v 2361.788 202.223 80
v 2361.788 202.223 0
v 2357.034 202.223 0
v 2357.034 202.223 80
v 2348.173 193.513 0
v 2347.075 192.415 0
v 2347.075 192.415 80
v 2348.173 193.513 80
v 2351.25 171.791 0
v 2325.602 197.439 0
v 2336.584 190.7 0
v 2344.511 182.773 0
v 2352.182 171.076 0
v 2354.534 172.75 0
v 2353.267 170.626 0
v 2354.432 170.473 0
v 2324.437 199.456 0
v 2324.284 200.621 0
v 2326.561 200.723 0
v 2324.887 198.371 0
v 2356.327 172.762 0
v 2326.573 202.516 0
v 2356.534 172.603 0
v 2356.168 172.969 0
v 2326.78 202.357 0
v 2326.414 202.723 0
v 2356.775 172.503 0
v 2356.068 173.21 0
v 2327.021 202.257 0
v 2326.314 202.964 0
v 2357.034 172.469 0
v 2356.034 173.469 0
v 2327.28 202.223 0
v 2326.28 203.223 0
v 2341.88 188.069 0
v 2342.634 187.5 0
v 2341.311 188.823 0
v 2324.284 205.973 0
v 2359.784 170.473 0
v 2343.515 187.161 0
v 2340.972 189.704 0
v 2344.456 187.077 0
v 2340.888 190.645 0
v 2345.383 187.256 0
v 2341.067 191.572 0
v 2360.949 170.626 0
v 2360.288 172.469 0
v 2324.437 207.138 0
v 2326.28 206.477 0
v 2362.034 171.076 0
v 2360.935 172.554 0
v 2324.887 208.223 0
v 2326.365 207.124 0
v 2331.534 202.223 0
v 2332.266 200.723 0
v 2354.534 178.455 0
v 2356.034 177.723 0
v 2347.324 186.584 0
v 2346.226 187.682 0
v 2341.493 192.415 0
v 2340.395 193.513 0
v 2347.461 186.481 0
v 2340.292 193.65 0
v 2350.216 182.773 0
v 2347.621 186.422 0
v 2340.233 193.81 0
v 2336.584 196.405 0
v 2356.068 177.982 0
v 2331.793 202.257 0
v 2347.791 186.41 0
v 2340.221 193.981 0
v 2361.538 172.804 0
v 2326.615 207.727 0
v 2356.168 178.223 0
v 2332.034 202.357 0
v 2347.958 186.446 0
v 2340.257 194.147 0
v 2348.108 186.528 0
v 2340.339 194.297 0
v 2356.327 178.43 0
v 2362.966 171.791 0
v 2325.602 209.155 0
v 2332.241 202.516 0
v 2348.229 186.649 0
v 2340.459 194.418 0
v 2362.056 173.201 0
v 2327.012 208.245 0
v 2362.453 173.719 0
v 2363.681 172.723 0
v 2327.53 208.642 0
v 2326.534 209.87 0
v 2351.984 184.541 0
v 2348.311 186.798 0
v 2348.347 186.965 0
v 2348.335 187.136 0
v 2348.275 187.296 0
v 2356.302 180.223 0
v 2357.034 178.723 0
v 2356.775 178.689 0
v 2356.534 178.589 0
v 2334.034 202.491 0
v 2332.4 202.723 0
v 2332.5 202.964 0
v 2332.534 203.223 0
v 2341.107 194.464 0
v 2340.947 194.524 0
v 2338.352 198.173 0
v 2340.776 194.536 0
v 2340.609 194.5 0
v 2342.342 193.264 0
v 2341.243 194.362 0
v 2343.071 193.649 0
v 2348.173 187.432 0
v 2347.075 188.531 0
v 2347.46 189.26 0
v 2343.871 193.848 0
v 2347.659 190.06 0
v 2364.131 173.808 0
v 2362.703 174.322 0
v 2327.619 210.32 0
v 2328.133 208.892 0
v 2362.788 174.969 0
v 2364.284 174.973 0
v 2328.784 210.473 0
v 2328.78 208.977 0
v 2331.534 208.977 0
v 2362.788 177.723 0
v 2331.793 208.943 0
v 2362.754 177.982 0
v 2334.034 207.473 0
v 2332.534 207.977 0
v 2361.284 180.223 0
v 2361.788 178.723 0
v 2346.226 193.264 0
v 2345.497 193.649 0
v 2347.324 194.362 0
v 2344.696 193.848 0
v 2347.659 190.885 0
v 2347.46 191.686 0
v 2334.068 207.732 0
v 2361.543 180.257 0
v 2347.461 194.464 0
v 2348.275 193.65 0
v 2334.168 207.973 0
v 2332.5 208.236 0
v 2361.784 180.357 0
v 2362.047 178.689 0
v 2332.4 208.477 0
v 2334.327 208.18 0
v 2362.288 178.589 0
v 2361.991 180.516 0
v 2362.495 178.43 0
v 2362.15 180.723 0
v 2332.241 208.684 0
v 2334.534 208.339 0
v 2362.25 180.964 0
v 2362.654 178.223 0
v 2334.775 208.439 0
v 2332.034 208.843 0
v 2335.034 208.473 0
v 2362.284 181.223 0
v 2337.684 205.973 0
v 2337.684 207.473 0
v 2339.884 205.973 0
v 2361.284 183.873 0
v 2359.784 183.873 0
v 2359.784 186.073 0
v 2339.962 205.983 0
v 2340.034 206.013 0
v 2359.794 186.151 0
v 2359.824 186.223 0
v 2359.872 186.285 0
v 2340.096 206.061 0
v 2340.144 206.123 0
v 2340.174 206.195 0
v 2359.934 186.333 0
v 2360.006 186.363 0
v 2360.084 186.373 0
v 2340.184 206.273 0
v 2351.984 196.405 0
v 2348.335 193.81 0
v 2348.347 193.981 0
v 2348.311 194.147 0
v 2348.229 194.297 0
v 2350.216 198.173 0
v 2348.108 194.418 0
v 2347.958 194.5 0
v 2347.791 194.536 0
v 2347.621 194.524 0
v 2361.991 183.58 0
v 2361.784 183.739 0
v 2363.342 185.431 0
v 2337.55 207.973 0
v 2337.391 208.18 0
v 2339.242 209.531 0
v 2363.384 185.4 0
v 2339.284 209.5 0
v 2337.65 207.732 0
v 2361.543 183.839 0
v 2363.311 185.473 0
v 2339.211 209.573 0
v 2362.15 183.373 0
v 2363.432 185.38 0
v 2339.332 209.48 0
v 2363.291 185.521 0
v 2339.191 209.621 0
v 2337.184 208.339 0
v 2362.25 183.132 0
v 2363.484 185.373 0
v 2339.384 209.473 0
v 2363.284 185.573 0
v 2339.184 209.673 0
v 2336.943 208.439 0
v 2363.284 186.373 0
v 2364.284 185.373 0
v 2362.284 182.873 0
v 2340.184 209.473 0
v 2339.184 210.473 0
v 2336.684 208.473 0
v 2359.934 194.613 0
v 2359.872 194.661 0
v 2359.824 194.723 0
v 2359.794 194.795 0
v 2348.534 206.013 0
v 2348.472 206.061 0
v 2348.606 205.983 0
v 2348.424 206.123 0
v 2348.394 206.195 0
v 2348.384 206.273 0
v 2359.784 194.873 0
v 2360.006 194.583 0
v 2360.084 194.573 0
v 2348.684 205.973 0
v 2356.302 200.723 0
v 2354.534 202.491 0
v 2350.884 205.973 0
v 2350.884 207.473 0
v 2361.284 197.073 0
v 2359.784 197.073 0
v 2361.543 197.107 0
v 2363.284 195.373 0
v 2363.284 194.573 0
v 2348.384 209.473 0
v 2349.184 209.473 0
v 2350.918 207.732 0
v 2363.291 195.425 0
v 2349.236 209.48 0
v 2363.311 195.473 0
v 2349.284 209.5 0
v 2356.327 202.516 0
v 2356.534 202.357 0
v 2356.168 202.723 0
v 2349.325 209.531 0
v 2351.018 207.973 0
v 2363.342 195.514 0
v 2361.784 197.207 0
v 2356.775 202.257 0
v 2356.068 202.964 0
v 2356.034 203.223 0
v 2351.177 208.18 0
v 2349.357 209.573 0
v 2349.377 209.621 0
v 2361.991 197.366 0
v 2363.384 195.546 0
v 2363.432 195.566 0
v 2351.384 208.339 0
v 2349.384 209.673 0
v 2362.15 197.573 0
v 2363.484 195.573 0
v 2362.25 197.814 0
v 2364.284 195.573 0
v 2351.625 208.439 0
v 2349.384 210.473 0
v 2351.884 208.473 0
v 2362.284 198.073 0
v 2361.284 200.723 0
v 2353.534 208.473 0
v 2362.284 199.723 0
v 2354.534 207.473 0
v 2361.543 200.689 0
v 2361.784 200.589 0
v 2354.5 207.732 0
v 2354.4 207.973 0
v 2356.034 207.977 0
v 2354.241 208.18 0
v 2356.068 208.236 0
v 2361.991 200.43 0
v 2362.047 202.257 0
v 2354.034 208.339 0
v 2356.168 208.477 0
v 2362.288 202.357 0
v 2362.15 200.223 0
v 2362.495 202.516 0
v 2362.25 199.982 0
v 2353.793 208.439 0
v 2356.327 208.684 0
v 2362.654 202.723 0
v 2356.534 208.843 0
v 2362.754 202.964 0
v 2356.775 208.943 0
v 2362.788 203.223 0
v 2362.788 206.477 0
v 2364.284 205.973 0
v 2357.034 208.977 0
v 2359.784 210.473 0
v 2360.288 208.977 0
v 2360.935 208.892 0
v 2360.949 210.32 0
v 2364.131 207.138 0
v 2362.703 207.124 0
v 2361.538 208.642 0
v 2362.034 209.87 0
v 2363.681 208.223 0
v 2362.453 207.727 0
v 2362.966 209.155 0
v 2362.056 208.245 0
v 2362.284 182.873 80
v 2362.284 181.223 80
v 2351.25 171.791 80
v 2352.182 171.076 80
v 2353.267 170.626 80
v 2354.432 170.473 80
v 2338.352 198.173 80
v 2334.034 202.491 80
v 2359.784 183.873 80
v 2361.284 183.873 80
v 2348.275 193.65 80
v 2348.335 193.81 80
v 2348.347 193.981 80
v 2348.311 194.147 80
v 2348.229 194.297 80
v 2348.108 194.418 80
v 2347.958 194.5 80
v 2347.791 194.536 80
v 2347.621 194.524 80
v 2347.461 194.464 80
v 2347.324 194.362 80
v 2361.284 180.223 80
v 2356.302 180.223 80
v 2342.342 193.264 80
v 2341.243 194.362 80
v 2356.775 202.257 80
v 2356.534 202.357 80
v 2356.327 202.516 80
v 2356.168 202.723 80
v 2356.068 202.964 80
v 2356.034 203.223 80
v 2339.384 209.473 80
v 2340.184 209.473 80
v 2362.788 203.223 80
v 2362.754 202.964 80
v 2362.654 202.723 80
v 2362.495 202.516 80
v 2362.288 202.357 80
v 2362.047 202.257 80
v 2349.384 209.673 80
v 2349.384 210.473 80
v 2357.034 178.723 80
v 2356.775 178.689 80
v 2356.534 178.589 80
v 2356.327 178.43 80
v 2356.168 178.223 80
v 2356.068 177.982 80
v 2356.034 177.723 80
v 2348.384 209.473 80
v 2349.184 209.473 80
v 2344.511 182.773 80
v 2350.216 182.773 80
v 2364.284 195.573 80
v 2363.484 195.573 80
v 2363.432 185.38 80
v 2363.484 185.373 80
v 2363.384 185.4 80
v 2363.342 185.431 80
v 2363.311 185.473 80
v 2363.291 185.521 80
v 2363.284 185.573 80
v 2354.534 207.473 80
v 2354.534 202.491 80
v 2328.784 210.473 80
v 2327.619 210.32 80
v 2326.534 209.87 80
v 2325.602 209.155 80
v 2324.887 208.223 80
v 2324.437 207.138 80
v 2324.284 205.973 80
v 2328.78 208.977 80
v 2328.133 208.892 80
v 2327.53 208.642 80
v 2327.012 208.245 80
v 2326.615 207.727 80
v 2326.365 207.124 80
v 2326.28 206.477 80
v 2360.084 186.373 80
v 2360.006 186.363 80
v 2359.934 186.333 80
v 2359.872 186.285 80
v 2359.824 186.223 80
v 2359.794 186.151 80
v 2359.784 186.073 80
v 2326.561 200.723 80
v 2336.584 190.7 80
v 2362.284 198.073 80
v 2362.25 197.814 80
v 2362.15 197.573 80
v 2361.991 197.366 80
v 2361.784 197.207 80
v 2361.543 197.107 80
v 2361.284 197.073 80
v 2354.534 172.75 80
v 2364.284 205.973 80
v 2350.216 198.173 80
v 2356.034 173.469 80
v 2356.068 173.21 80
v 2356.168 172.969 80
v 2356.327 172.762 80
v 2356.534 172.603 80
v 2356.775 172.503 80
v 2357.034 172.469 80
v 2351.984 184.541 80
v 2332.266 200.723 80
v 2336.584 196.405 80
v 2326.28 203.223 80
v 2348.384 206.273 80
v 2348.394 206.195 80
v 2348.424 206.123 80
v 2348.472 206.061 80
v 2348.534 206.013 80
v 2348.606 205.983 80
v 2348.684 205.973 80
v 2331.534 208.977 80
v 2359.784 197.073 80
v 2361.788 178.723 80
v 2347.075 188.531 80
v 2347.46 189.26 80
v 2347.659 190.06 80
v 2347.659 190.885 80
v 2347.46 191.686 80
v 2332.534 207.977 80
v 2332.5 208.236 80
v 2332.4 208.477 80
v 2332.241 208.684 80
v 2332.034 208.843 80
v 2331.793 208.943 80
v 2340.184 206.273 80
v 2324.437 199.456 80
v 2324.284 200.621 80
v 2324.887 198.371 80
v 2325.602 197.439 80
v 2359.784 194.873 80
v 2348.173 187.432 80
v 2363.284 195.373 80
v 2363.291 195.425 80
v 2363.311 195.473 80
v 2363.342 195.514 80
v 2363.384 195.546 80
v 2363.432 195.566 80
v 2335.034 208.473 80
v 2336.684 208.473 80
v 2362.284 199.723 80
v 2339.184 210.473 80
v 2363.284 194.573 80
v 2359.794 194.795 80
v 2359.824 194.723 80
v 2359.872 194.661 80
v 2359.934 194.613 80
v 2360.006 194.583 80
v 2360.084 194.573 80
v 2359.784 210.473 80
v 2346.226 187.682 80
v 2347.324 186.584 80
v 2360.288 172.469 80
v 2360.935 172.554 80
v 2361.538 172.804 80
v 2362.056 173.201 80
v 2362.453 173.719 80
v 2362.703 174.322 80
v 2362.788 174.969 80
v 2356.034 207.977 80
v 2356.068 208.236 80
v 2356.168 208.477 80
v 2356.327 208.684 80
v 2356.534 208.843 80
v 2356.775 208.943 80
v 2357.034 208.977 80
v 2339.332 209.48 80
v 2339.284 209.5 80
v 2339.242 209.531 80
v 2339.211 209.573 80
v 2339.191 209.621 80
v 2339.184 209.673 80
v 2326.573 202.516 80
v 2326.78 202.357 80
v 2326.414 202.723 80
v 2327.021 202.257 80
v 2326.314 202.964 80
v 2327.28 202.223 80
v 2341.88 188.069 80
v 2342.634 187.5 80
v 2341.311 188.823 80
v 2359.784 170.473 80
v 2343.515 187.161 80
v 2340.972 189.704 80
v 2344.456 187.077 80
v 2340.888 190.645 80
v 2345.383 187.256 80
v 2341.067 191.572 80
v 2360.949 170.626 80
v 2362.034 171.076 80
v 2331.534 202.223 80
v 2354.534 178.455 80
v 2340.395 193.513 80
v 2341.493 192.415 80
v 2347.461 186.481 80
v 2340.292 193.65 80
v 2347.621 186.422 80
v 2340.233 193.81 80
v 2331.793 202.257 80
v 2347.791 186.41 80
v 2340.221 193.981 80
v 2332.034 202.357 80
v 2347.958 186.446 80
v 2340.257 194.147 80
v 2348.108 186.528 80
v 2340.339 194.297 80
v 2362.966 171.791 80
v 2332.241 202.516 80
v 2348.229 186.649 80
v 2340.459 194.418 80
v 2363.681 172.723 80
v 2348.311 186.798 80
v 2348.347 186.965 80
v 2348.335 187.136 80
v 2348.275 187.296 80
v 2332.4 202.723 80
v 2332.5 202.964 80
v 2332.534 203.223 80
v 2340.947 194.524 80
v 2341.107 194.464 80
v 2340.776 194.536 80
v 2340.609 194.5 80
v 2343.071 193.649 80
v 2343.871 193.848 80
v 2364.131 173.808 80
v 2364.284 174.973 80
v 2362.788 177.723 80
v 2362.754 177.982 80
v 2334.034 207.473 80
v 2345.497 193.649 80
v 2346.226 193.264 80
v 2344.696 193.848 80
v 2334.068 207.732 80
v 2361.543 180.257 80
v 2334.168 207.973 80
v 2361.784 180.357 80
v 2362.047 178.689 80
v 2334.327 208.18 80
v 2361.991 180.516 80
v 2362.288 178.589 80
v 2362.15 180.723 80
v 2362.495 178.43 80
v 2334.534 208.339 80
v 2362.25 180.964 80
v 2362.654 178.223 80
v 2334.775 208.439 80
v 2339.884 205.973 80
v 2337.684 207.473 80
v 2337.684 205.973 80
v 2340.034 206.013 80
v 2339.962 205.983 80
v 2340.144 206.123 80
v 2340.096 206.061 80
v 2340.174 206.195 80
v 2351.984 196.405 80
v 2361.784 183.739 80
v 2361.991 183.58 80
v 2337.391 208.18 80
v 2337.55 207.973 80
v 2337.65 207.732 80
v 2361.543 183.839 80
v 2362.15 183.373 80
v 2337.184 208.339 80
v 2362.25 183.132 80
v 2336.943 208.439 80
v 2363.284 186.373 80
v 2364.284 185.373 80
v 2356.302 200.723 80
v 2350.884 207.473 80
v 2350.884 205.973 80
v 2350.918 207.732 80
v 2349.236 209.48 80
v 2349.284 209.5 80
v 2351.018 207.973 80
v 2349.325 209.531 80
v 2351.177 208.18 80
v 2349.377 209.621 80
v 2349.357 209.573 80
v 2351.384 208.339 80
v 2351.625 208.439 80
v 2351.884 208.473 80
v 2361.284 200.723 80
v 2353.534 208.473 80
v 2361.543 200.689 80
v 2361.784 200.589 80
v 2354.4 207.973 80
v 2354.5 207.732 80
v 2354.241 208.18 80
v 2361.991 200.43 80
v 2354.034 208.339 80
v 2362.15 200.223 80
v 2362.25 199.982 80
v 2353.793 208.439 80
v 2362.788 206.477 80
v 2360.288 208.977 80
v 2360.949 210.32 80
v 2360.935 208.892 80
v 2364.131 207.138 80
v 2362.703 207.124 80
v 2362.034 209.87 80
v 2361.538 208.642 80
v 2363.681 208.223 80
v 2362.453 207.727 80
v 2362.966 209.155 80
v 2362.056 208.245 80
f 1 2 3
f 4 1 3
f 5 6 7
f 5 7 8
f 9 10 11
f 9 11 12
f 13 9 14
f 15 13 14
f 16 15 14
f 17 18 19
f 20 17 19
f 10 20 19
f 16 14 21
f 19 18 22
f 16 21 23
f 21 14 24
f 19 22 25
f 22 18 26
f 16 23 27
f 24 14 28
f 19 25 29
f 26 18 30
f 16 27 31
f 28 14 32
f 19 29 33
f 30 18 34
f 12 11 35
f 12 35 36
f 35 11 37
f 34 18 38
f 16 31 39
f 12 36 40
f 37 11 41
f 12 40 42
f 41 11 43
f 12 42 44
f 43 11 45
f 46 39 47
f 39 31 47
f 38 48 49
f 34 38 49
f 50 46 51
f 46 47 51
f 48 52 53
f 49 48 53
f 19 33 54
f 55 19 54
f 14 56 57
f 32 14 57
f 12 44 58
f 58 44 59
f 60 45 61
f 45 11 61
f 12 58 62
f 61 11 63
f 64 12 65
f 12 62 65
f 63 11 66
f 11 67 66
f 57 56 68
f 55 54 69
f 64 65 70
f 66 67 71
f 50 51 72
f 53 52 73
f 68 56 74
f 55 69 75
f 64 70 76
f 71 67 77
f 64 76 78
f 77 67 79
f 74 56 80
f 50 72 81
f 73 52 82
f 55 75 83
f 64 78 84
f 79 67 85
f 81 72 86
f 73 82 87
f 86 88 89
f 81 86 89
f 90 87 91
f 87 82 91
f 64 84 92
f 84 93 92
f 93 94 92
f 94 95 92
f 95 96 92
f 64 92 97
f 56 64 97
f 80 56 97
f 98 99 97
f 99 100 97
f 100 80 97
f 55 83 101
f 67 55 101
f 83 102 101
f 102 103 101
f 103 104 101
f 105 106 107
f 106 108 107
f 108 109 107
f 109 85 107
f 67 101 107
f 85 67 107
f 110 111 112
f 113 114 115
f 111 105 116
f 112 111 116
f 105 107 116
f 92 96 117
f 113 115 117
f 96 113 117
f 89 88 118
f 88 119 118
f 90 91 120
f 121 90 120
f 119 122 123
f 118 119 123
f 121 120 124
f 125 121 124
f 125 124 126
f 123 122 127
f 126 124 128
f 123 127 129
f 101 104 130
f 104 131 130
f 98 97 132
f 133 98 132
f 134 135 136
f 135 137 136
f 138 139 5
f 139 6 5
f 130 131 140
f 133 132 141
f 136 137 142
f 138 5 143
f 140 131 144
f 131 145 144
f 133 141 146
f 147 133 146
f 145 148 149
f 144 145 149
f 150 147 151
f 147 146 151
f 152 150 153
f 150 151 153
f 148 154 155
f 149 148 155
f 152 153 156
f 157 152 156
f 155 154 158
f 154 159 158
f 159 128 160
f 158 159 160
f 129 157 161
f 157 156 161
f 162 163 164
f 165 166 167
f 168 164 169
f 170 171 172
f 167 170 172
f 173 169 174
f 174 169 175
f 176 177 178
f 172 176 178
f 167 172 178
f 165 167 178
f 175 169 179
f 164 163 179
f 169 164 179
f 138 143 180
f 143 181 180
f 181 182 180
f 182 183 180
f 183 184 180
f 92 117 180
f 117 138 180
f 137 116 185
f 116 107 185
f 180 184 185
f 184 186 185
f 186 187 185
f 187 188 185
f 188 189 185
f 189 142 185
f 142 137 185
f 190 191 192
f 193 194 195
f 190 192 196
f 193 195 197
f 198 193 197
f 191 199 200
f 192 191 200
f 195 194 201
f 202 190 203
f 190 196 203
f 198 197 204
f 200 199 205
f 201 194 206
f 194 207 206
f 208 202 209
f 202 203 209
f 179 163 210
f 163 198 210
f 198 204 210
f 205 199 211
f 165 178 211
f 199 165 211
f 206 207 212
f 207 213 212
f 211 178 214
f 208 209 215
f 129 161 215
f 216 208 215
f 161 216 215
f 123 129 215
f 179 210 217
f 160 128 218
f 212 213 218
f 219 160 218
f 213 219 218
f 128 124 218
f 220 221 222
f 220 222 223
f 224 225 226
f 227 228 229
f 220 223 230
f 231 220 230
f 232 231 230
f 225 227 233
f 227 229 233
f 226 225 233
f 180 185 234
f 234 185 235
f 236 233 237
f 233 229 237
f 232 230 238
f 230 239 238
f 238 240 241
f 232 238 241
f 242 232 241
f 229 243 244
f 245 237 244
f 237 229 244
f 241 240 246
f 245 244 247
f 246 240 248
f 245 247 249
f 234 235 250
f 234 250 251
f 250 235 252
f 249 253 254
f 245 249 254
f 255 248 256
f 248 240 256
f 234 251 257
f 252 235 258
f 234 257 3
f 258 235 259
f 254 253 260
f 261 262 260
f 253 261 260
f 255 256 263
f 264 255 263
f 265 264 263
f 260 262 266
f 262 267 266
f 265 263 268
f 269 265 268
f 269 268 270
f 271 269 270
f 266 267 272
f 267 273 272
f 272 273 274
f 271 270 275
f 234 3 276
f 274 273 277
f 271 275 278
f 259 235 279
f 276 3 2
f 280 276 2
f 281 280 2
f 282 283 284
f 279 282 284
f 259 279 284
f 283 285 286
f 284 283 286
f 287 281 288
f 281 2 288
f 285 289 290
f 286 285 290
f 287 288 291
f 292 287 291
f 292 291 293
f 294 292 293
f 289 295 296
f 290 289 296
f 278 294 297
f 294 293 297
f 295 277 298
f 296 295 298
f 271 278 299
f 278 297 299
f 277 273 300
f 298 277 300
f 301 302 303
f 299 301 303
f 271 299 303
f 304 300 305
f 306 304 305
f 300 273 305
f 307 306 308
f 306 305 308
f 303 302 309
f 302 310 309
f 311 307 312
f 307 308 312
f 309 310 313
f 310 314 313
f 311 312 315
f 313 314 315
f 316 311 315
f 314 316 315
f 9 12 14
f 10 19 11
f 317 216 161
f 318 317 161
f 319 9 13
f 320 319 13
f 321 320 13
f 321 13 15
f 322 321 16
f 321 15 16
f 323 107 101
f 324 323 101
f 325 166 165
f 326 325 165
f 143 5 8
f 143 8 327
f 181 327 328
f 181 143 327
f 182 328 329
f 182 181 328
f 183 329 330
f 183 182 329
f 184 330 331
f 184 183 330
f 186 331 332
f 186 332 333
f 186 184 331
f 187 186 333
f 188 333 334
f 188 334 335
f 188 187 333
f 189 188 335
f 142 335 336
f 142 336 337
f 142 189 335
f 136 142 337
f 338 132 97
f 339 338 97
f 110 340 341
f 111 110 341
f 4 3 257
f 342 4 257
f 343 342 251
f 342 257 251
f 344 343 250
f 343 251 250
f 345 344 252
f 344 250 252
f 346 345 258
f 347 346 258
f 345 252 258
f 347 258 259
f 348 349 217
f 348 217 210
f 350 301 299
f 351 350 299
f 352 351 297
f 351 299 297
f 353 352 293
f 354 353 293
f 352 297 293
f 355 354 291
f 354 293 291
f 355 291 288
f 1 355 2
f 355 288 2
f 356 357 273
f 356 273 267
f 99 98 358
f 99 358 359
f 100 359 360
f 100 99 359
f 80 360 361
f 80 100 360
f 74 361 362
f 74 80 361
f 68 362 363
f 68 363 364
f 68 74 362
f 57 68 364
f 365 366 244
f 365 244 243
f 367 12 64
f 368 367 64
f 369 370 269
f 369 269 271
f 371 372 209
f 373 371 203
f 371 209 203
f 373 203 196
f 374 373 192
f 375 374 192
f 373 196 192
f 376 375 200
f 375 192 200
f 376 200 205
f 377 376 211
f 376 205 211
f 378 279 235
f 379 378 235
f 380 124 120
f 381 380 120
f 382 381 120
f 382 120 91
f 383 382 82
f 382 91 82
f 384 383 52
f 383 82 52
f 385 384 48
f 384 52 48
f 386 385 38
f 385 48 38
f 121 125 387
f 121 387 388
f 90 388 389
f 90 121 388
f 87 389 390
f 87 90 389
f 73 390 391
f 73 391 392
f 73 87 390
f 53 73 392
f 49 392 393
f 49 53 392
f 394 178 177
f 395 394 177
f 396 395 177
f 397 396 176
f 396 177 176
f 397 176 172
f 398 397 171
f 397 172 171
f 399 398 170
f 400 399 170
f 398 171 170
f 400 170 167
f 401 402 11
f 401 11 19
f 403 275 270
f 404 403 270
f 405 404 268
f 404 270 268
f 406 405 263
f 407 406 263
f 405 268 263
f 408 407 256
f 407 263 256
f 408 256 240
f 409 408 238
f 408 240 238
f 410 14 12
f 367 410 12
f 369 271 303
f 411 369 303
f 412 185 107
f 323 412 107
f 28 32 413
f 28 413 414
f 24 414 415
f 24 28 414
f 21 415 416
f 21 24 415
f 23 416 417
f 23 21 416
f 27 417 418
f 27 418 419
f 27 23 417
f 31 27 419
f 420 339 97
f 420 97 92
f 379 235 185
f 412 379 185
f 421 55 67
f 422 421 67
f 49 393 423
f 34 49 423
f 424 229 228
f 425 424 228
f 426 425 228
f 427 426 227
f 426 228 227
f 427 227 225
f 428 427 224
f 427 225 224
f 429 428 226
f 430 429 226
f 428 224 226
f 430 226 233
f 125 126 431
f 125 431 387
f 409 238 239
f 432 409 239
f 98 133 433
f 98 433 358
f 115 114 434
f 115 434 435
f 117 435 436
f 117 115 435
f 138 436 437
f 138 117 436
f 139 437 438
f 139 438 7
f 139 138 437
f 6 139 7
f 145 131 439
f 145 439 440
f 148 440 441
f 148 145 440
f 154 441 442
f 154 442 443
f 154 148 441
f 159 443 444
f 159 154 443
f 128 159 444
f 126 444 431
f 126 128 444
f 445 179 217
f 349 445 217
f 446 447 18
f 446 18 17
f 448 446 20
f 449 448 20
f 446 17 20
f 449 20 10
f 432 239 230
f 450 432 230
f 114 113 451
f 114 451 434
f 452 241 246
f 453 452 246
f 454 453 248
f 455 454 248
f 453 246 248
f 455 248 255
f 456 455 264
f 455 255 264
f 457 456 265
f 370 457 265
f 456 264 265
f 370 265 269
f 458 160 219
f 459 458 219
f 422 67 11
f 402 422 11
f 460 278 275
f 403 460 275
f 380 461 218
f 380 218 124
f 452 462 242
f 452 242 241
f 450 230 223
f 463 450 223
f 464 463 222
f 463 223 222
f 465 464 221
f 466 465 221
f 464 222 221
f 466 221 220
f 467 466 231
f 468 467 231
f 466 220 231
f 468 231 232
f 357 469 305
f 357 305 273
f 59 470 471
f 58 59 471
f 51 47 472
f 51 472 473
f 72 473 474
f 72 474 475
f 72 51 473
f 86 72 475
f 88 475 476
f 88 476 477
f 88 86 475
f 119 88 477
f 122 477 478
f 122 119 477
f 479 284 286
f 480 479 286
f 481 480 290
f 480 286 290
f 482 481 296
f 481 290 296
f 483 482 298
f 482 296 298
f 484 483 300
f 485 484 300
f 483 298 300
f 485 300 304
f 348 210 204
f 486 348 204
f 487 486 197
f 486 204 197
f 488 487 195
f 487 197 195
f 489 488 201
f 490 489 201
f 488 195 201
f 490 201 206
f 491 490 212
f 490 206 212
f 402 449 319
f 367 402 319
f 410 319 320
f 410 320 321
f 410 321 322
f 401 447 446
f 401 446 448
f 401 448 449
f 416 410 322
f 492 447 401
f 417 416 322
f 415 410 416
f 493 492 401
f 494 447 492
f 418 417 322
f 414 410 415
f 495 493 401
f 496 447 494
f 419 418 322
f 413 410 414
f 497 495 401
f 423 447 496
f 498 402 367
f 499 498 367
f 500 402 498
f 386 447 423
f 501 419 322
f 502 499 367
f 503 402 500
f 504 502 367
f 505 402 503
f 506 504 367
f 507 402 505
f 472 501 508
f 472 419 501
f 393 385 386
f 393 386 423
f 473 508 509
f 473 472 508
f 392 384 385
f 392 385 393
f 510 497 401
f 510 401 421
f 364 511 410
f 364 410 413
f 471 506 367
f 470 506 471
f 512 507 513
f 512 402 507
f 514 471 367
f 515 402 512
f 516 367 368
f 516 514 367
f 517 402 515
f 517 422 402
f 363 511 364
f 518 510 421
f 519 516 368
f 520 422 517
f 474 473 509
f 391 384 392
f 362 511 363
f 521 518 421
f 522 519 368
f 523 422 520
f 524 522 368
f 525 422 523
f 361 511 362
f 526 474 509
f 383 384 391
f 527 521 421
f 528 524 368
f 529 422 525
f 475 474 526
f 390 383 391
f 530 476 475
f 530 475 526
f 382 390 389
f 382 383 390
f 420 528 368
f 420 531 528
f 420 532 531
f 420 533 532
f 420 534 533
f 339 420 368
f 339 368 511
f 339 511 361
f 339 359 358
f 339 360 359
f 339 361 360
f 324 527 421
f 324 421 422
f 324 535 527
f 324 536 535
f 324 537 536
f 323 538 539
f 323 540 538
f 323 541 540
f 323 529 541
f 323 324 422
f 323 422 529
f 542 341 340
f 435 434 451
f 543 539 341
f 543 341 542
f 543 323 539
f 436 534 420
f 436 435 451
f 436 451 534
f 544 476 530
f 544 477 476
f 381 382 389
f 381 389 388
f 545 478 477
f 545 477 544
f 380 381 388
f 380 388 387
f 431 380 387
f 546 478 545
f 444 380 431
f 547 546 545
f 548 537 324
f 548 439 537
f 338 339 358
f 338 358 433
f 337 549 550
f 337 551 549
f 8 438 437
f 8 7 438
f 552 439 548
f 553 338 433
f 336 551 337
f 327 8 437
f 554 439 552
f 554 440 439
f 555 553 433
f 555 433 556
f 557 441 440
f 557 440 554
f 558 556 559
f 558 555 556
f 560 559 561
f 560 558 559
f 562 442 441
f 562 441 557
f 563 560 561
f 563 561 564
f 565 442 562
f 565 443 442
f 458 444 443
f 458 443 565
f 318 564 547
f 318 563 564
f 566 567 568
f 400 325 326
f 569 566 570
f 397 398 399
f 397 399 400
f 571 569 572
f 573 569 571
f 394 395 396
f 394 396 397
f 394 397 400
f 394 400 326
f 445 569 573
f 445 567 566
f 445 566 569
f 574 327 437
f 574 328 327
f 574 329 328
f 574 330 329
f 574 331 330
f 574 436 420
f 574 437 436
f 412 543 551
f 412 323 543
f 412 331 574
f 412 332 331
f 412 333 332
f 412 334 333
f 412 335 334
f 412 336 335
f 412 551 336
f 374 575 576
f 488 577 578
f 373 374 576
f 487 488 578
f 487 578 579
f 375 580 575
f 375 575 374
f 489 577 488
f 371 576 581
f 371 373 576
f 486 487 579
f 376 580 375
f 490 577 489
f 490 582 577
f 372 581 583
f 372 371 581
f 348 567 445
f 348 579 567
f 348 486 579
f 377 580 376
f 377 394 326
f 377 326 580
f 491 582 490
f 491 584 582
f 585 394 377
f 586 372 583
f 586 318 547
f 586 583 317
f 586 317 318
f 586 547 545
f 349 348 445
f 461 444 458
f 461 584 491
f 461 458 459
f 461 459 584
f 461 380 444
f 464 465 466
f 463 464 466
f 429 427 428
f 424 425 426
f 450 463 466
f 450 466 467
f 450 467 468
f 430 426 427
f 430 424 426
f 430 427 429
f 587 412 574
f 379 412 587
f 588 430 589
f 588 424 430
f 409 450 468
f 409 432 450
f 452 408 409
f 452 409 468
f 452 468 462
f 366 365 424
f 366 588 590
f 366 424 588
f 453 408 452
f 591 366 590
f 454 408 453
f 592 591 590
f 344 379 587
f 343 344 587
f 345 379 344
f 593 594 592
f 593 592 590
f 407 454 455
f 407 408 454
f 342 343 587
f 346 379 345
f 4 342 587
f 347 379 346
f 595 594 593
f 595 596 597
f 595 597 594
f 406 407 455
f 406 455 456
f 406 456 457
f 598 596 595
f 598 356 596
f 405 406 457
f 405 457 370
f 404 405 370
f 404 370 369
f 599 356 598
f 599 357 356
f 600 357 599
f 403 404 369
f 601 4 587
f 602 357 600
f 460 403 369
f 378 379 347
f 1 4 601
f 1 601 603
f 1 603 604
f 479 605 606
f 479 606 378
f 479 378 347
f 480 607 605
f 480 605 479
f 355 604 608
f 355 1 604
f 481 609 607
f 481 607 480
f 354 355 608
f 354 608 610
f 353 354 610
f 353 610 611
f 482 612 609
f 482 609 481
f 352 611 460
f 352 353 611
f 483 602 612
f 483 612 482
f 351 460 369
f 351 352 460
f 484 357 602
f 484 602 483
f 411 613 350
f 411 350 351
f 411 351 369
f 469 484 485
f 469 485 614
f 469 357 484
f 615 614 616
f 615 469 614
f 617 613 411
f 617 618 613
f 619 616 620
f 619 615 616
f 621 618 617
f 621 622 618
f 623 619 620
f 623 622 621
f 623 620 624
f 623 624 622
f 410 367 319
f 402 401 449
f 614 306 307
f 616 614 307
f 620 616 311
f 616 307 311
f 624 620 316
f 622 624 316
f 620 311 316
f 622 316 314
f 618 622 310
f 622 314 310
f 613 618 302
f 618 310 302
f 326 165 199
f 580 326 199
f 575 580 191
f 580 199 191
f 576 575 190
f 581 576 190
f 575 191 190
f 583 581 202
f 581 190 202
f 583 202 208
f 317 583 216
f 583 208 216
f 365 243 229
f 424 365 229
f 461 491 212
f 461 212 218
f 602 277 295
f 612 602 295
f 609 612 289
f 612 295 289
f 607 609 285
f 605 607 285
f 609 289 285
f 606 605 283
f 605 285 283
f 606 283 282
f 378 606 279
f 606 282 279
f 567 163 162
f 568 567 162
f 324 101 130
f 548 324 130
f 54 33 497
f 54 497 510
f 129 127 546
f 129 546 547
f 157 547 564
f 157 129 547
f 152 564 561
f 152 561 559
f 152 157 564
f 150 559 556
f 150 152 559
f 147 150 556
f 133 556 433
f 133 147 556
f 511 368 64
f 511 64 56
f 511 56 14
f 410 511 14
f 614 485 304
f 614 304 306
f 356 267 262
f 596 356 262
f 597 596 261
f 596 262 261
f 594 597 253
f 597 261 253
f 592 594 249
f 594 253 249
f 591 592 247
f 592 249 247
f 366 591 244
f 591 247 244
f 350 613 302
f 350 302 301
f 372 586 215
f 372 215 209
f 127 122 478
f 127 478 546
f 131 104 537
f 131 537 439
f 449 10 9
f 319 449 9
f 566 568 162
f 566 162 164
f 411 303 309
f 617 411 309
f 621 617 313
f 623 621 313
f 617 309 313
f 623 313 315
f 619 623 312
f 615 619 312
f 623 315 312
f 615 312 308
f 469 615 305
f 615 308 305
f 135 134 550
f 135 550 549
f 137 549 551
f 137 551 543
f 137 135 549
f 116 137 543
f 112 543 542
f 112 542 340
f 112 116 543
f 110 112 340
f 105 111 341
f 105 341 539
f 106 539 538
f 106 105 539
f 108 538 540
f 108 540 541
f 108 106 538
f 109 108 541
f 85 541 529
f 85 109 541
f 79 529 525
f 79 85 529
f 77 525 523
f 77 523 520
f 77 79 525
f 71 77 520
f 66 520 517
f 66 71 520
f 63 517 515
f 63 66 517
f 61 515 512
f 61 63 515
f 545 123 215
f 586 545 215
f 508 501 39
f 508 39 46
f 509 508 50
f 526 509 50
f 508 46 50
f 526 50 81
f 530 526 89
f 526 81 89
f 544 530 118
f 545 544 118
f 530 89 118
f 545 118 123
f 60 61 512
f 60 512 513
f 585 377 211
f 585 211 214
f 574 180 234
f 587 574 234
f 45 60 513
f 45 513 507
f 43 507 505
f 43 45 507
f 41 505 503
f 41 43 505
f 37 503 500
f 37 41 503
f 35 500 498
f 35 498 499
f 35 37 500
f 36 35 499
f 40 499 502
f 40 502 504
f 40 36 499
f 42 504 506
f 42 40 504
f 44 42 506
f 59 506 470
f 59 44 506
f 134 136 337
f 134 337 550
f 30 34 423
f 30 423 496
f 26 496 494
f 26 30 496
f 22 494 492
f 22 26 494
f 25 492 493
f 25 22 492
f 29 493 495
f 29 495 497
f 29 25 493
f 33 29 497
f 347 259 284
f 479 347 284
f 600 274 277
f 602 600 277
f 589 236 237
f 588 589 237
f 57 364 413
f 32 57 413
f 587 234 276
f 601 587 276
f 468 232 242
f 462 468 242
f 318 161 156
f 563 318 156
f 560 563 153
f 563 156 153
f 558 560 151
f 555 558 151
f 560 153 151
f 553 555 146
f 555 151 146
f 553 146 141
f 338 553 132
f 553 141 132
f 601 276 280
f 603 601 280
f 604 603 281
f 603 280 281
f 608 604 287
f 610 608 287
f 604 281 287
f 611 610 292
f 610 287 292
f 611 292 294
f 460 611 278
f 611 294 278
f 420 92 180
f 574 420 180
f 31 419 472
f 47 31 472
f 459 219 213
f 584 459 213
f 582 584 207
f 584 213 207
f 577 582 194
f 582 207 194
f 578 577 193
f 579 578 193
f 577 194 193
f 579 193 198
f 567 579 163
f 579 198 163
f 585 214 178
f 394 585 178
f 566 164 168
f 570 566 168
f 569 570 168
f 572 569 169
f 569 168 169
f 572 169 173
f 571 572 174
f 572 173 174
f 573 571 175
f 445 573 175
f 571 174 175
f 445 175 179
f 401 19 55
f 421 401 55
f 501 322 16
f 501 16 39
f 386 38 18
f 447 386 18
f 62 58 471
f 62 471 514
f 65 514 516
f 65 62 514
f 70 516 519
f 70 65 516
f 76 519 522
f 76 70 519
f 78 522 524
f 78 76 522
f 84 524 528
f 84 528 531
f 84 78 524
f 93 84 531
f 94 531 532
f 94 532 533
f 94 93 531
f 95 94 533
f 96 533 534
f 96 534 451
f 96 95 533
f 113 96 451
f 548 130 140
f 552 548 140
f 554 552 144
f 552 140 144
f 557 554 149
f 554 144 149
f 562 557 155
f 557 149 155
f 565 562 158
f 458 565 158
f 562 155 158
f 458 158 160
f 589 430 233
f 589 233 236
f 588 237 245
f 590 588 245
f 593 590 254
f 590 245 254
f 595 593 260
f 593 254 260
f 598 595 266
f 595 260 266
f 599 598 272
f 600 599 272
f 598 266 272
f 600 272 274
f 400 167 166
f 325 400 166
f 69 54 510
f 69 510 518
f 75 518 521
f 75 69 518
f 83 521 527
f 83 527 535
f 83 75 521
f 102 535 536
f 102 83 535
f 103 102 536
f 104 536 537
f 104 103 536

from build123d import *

# Parameters (mm, degrees)
EXTRUDE_1_DEPTH = 80


with BuildPart() as part:
    # 草图1 → 凸台-拉伸1 (new body)
    with BuildSketch(Plane.XY):
        with BuildLine():
            Line((2339.183862097, 210.472909404), (2328.783862097, 210.472909404))
            ThreePointArc((2328.783862097, 210.472909404), (2325.601881582, 209.15488992), (2324.283862097, 205.972909404))
            Line((2324.283862097, 205.972909404), (2324.283862097, 200.621141682))
            ThreePointArc((2324.283862097, 200.621141682), (2324.626404201, 198.899066237), (2325.601881582, 197.439161167))
            Line((2325.601881582, 197.439161167), (2351.25011386, 171.790928889))
            ThreePointArc((2351.25011386, 171.790928889), (2352.71001893, 170.815451508), (2354.432094375, 170.472909404))
            Line((2354.432094375, 170.472909404), (2359.783862097, 170.472909404))
            ThreePointArc((2359.783862097, 170.472909404), (2362.965842612, 171.790928889), (2364.283862097, 174.972909404))
            Line((2364.283862097, 174.972909404), (2364.283862097, 185.372909404))
            Line((2364.283862097, 185.372909404), (2363.483862097, 185.372909404))
            ThreePointArc((2363.483862097, 185.372909404), (2363.342440741, 185.431488048), (2363.283862097, 185.572909404))
            Line((2363.283862097, 185.572909404), (2363.283862097, 186.372909404))
            Line((2363.283862097, 186.372909404), (2360.083862097, 186.372909404))
            ThreePointArc((2360.083862097, 186.372909404), (2359.871730063, 186.285041439), (2359.783862097, 186.072909404))
            Line((2359.783862097, 186.072909404), (2359.783862097, 183.872909404))
            Line((2359.783862097, 183.872909404), (2361.283862097, 183.872909404))
            ThreePointArc((2361.283862097, 183.872909404), (2361.990968878, 183.580016185), (2362.283862097, 182.872909404))
            Line((2362.283862097, 182.872909404), (2362.283862097, 181.222909404))
            ThreePointArc((2362.283862097, 181.222909404), (2361.990968878, 180.515802623), (2361.283862097, 180.222909404))
            Line((2361.283862097, 180.222909404), (2356.30162905, 180.222909404))
            Line((2356.30162905, 180.222909404), (2351.983862097, 184.540676357))
            Line((2351.983862097, 184.540676357), (2351.983862097, 196.405142451))
            Line((2351.983862097, 196.405142451), (2356.30162905, 200.722909404))
            Line((2356.30162905, 200.722909404), (2361.283862097, 200.722909404))
            ThreePointArc((2361.283862097, 200.722909404), (2361.990968878, 200.430016185), (2362.283862097, 199.722909404))
            Line((2362.283862097, 199.722909404), (2362.283862097, 198.072909404))
            ThreePointArc((2362.283862097, 198.072909404), (2361.990968878, 197.365802623), (2361.283862097, 197.072909404))
            Line((2361.283862097, 197.072909404), (2359.783862097, 197.072909404))
            Line((2359.783862097, 197.072909404), (2359.783862097, 194.872909404))
            ThreePointArc((2359.783862097, 194.872909404), (2359.871730063, 194.66077737), (2360.083862097, 194.572909404))
            Line((2360.083862097, 194.572909404), (2363.283862097, 194.572909404))
            Line((2363.283862097, 194.572909404), (2363.283862097, 195.372909404))
            ThreePointArc((2363.283862097, 195.372909404), (2363.342440741, 195.514330761), (2363.483862097, 195.572909404))
            Line((2363.483862097, 195.572909404), (2364.283862097, 195.572909404))
            Line((2364.283862097, 195.572909404), (2364.283862097, 205.972909404))
            ThreePointArc((2364.283862097, 205.972909404), (2362.965842612, 209.15488992), (2359.783862097, 210.472909404))
            Line((2359.783862097, 210.472909404), (2349.383862097, 210.472909404))
            Line((2349.383862097, 210.472909404), (2349.383862097, 209.672909404))
            ThreePointArc((2349.383862097, 209.672909404), (2349.325283453, 209.531488048), (2349.183862097, 209.472909404))
            Line((2349.183862097, 209.472909404), (2348.383862097, 209.472909404))
            Line((2348.383862097, 209.472909404), (2348.383862097, 206.272909404))
            ThreePointArc((2348.383862097, 206.272909404), (2348.471730063, 206.06077737), (2348.683862097, 205.972909404))
            Line((2348.683862097, 205.972909404), (2350.883862097, 205.972909404))
            Line((2350.883862097, 205.972909404), (2350.883862097, 207.472909404))
            ThreePointArc((2350.883862097, 207.472909404), (2351.176755316, 208.180016185), (2351.883862097, 208.472909404))
            Line((2351.883862097, 208.472909404), (2353.533862097, 208.472909404))
            ThreePointArc((2353.533862097, 208.472909404), (2354.240968878, 208.180016185), (2354.533862097, 207.472909404))
            Line((2354.533862097, 207.472909404), (2354.533862097, 202.490676357))
            Line((2354.533862097, 202.490676357), (2350.216095144, 198.172909404))
            Line((2350.216095144, 198.172909404), (2338.35162905, 198.172909404))
            Line((2338.35162905, 198.172909404), (2334.033862097, 202.490676357))
            Line((2334.033862097, 202.490676357), (2334.033862097, 207.472909404))
            ThreePointArc((2334.033862097, 207.472909404), (2334.326755316, 208.180016185), (2335.033862097, 208.472909404))
            Line((2335.033862097, 208.472909404), (2336.683862097, 208.472909404))
            ThreePointArc((2336.683862097, 208.472909404), (2337.390968878, 208.180016185), (2337.683862097, 207.472909404))
            Line((2337.683862097, 207.472909404), (2337.683862097, 205.972909404))
            Line((2337.683862097, 205.972909404), (2339.883862097, 205.972909404))
            ThreePointArc((2339.883862097, 205.972909404), (2340.095994131, 206.06077737), (2340.183862097, 206.272909404))
            Line((2340.183862097, 206.272909404), (2340.183862097, 209.472909404))
            Line((2340.183862097, 209.472909404), (2339.383862097, 209.472909404))
            ThreePointArc((2339.383862097, 209.472909404), (2339.242440741, 209.531488048), (2339.183862097, 209.672909404))
            Line((2339.183862097, 209.672909404), (2339.183862097, 210.472909404))
        make_face()
        with BuildLine():
            Line((2326.279862097, 206.476909404), (2326.279862097, 203.222909404))
            ThreePointArc((2326.279862097, 203.222909404), (2326.572755316, 202.515802623), (2327.279862097, 202.222909404))
            Line((2327.279862097, 202.222909404), (2331.533862097, 202.222909404))
            ThreePointArc((2331.533862097, 202.222909404), (2332.240968878, 202.515802623), (2332.533862097, 203.222909404))
            Line((2332.533862097, 203.222909404), (2332.533862097, 207.976909404))
            ThreePointArc((2332.533862097, 207.976909404), (2332.240968878, 208.684016185), (2331.533862097, 208.976909404))
            Line((2331.533862097, 208.976909404), (2328.779862097, 208.976909404))
            ThreePointArc((2328.779862097, 208.976909404), (2327.012095144, 208.244676357), (2326.279862097, 206.476909404))
        make_face(mode=Mode.SUBTRACT)
        Polygon((2344.510774032, 182.772909404), (2350.216095144, 182.772909404), (2354.533862097, 178.455142451), (2354.533862097, 172.749821339), align=None, mode=Mode.SUBTRACT)
        Polygon((2336.583862097, 196.405142451), (2336.583862097, 190.699821339), (2326.560774032, 200.722909404), (2332.266095144, 200.722909404), align=None, mode=Mode.SUBTRACT)
        with BuildLine():
            Line((2362.787862097, 206.476909404), (2362.787862097, 203.222909404))
            ThreePointArc((2362.787862097, 203.222909404), (2362.494968878, 202.515802623), (2361.787862097, 202.222909404))
            Line((2361.787862097, 202.222909404), (2357.033862097, 202.222909404))
            ThreePointArc((2357.033862097, 202.222909404), (2356.326755316, 202.515802623), (2356.033862097, 203.222909404))
            Line((2356.033862097, 203.222909404), (2356.033862097, 207.976909404))
            ThreePointArc((2356.033862097, 207.976909404), (2356.326755316, 208.684016185), (2357.033862097, 208.976909404))
            Line((2357.033862097, 208.976909404), (2360.287862097, 208.976909404))
            ThreePointArc((2360.287862097, 208.976909404), (2362.05562905, 208.244676357), (2362.787862097, 206.476909404))
        make_face(mode=Mode.SUBTRACT)
        with BuildLine():
            Line((2362.787862097, 174.968909404), (2362.787862097, 177.722909404))
            ThreePointArc((2362.787862097, 177.722909404), (2362.494968878, 178.430016185), (2361.787862097, 178.722909404))
            Line((2361.787862097, 178.722909404), (2357.033862097, 178.722909404))
            ThreePointArc((2357.033862097, 178.722909404), (2356.326755316, 178.430016185), (2356.033862097, 177.722909404))
            Line((2356.033862097, 177.722909404), (2356.033862097, 173.468909404))
            ThreePointArc((2356.033862097, 173.468909404), (2356.326755316, 172.761802623), (2357.033862097, 172.468909404))
            Line((2357.033862097, 172.468909404), (2360.287862097, 172.468909404))
            ThreePointArc((2360.287862097, 172.468909404), (2362.05562905, 173.201142451), (2362.787862097, 174.968909404))
        make_face(mode=Mode.SUBTRACT)
        with BuildLine():
            Line((2347.324421256, 194.361996701), (2346.226029942, 193.263605386))
            ThreePointArc((2346.226029942, 193.263605386), (2344.283862097, 193.872909404), (2342.341694253, 193.263605386))
            Line((2342.341694253, 193.263605386), (2341.243302938, 194.361996701))
            ThreePointArc((2341.243302938, 194.361996701), (2340.394774801, 194.361996701), (2340.394774801, 193.513468563))
            Line((2340.394774801, 193.513468563), (2341.493166115, 192.415077249))
            ThreePointArc((2341.493166115, 192.415077249), (2341.879699041, 188.068746348), (2346.226029942, 187.682213422))
            Line((2346.226029942, 187.682213422), (2347.324421256, 186.583822108))
            ThreePointArc((2347.324421256, 186.583822108), (2348.172949394, 186.583822108), (2348.172949394, 187.432350245))
            Line((2348.172949394, 187.432350245), (2347.074558079, 188.53074156))
            ThreePointArc((2347.074558079, 188.53074156), (2347.683862097, 190.472909404), (2347.074558079, 192.415077249))
            Line((2347.074558079, 192.415077249), (2348.172949394, 193.513468563))
            ThreePointArc((2348.172949394, 193.513468563), (2348.172949394, 194.361996701), (2347.324421256, 194.361996701))
        make_face(mode=Mode.SUBTRACT)
    extrude(amount=EXTRUDE_1_DEPTH)


solid = part.part
